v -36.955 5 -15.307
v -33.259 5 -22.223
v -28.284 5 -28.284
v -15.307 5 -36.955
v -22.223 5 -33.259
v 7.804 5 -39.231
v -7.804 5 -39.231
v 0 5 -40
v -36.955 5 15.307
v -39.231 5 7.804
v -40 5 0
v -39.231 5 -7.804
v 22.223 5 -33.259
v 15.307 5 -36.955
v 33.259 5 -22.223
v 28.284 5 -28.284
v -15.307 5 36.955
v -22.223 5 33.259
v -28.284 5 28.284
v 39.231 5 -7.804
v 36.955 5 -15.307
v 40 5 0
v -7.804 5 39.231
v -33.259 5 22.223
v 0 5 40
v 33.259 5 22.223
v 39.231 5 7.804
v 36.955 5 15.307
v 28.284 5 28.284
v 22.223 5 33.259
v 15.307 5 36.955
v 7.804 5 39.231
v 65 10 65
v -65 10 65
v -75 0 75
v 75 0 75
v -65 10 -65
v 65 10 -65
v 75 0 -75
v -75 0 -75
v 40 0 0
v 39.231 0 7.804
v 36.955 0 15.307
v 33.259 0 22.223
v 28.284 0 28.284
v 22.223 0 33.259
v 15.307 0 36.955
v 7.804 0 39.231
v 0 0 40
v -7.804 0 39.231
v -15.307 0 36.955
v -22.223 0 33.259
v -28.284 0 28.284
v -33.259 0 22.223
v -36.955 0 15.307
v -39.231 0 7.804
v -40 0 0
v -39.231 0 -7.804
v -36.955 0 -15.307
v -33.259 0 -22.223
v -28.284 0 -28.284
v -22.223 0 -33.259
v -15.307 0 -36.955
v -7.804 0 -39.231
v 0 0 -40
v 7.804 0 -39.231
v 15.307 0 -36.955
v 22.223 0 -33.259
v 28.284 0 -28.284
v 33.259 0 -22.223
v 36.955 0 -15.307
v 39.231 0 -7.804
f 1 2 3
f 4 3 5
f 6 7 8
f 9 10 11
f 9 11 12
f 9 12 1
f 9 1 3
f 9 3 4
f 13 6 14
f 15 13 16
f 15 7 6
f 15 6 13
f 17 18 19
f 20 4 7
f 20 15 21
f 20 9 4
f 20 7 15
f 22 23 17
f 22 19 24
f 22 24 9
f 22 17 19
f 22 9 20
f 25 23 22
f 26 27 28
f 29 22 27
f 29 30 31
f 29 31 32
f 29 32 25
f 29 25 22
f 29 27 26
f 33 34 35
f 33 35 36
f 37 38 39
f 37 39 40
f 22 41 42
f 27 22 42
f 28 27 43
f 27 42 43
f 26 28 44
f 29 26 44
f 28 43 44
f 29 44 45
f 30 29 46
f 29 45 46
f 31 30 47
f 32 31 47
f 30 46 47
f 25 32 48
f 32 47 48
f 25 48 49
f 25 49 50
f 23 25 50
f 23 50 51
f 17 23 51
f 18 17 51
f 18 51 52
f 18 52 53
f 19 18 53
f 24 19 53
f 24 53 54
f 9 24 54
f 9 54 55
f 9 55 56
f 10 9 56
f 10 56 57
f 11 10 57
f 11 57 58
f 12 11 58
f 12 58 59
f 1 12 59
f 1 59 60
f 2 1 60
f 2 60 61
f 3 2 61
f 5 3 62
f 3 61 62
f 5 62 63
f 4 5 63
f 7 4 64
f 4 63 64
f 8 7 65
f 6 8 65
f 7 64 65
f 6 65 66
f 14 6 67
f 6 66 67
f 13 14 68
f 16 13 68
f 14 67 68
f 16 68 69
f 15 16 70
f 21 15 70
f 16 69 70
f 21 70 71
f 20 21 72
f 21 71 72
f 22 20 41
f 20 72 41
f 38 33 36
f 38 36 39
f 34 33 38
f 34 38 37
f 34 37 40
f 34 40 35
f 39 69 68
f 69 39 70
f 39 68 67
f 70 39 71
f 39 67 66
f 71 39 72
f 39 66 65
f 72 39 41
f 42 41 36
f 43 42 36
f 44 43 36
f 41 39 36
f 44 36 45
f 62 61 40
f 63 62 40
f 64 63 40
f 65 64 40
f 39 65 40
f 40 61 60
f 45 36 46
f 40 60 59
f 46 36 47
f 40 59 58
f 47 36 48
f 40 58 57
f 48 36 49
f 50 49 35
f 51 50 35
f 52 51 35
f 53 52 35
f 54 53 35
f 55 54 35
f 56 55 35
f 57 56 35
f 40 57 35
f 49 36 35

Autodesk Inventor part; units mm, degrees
ref_plane "YZ Plane" through (0, 0, 0) normal (1, 0, 0) x (0, 1, 0)
ref_plane "XZ Plane" through (0, 0, 0) normal (0, 1, 0) x (-1, 0, 0)
ref_plane "XY Plane" through (0, 0, 0) normal (0, 0, 1) x (1, 0, 0)
sketch "Sketch1" plane through (0, 0, 0) normal (0, 1, 0) x (-1, 0, 0)
  line L0 (75, -75) -> (-75, -75)
  line L1 (-75, -75) -> (-75, 75)
  line L2 (-75, 75) -> (75, 75)
  line L3 (75, 75) -> (75, -75)
  line L4 (75, -75) -> (-75, 75) construction
  line L5 (-75, -75) -> (75, 75) construction
  point P0 (0, 0)
  dimension "d0" = 150
  dimension "d1" = 150
extrude "Extrusion1" add sketch "Sketch1" along normal blind 10
chamfer "Chamfer1" distance 10 angle 45 4 edges at (0, 10, 75) (-75, 10, 0) (0, 10, -75) (75, 10, 0)
sketch "Sketch2" plane through (0, 0, 0) normal (0, -1, 0) x (1, 0, 0)
  circle A0 centre (0, 0) radius 40
  dimension "d7" = 80
extrude "Extrusion2" cut sketch "Sketch2" against normal blind 5
properties part number "side"
